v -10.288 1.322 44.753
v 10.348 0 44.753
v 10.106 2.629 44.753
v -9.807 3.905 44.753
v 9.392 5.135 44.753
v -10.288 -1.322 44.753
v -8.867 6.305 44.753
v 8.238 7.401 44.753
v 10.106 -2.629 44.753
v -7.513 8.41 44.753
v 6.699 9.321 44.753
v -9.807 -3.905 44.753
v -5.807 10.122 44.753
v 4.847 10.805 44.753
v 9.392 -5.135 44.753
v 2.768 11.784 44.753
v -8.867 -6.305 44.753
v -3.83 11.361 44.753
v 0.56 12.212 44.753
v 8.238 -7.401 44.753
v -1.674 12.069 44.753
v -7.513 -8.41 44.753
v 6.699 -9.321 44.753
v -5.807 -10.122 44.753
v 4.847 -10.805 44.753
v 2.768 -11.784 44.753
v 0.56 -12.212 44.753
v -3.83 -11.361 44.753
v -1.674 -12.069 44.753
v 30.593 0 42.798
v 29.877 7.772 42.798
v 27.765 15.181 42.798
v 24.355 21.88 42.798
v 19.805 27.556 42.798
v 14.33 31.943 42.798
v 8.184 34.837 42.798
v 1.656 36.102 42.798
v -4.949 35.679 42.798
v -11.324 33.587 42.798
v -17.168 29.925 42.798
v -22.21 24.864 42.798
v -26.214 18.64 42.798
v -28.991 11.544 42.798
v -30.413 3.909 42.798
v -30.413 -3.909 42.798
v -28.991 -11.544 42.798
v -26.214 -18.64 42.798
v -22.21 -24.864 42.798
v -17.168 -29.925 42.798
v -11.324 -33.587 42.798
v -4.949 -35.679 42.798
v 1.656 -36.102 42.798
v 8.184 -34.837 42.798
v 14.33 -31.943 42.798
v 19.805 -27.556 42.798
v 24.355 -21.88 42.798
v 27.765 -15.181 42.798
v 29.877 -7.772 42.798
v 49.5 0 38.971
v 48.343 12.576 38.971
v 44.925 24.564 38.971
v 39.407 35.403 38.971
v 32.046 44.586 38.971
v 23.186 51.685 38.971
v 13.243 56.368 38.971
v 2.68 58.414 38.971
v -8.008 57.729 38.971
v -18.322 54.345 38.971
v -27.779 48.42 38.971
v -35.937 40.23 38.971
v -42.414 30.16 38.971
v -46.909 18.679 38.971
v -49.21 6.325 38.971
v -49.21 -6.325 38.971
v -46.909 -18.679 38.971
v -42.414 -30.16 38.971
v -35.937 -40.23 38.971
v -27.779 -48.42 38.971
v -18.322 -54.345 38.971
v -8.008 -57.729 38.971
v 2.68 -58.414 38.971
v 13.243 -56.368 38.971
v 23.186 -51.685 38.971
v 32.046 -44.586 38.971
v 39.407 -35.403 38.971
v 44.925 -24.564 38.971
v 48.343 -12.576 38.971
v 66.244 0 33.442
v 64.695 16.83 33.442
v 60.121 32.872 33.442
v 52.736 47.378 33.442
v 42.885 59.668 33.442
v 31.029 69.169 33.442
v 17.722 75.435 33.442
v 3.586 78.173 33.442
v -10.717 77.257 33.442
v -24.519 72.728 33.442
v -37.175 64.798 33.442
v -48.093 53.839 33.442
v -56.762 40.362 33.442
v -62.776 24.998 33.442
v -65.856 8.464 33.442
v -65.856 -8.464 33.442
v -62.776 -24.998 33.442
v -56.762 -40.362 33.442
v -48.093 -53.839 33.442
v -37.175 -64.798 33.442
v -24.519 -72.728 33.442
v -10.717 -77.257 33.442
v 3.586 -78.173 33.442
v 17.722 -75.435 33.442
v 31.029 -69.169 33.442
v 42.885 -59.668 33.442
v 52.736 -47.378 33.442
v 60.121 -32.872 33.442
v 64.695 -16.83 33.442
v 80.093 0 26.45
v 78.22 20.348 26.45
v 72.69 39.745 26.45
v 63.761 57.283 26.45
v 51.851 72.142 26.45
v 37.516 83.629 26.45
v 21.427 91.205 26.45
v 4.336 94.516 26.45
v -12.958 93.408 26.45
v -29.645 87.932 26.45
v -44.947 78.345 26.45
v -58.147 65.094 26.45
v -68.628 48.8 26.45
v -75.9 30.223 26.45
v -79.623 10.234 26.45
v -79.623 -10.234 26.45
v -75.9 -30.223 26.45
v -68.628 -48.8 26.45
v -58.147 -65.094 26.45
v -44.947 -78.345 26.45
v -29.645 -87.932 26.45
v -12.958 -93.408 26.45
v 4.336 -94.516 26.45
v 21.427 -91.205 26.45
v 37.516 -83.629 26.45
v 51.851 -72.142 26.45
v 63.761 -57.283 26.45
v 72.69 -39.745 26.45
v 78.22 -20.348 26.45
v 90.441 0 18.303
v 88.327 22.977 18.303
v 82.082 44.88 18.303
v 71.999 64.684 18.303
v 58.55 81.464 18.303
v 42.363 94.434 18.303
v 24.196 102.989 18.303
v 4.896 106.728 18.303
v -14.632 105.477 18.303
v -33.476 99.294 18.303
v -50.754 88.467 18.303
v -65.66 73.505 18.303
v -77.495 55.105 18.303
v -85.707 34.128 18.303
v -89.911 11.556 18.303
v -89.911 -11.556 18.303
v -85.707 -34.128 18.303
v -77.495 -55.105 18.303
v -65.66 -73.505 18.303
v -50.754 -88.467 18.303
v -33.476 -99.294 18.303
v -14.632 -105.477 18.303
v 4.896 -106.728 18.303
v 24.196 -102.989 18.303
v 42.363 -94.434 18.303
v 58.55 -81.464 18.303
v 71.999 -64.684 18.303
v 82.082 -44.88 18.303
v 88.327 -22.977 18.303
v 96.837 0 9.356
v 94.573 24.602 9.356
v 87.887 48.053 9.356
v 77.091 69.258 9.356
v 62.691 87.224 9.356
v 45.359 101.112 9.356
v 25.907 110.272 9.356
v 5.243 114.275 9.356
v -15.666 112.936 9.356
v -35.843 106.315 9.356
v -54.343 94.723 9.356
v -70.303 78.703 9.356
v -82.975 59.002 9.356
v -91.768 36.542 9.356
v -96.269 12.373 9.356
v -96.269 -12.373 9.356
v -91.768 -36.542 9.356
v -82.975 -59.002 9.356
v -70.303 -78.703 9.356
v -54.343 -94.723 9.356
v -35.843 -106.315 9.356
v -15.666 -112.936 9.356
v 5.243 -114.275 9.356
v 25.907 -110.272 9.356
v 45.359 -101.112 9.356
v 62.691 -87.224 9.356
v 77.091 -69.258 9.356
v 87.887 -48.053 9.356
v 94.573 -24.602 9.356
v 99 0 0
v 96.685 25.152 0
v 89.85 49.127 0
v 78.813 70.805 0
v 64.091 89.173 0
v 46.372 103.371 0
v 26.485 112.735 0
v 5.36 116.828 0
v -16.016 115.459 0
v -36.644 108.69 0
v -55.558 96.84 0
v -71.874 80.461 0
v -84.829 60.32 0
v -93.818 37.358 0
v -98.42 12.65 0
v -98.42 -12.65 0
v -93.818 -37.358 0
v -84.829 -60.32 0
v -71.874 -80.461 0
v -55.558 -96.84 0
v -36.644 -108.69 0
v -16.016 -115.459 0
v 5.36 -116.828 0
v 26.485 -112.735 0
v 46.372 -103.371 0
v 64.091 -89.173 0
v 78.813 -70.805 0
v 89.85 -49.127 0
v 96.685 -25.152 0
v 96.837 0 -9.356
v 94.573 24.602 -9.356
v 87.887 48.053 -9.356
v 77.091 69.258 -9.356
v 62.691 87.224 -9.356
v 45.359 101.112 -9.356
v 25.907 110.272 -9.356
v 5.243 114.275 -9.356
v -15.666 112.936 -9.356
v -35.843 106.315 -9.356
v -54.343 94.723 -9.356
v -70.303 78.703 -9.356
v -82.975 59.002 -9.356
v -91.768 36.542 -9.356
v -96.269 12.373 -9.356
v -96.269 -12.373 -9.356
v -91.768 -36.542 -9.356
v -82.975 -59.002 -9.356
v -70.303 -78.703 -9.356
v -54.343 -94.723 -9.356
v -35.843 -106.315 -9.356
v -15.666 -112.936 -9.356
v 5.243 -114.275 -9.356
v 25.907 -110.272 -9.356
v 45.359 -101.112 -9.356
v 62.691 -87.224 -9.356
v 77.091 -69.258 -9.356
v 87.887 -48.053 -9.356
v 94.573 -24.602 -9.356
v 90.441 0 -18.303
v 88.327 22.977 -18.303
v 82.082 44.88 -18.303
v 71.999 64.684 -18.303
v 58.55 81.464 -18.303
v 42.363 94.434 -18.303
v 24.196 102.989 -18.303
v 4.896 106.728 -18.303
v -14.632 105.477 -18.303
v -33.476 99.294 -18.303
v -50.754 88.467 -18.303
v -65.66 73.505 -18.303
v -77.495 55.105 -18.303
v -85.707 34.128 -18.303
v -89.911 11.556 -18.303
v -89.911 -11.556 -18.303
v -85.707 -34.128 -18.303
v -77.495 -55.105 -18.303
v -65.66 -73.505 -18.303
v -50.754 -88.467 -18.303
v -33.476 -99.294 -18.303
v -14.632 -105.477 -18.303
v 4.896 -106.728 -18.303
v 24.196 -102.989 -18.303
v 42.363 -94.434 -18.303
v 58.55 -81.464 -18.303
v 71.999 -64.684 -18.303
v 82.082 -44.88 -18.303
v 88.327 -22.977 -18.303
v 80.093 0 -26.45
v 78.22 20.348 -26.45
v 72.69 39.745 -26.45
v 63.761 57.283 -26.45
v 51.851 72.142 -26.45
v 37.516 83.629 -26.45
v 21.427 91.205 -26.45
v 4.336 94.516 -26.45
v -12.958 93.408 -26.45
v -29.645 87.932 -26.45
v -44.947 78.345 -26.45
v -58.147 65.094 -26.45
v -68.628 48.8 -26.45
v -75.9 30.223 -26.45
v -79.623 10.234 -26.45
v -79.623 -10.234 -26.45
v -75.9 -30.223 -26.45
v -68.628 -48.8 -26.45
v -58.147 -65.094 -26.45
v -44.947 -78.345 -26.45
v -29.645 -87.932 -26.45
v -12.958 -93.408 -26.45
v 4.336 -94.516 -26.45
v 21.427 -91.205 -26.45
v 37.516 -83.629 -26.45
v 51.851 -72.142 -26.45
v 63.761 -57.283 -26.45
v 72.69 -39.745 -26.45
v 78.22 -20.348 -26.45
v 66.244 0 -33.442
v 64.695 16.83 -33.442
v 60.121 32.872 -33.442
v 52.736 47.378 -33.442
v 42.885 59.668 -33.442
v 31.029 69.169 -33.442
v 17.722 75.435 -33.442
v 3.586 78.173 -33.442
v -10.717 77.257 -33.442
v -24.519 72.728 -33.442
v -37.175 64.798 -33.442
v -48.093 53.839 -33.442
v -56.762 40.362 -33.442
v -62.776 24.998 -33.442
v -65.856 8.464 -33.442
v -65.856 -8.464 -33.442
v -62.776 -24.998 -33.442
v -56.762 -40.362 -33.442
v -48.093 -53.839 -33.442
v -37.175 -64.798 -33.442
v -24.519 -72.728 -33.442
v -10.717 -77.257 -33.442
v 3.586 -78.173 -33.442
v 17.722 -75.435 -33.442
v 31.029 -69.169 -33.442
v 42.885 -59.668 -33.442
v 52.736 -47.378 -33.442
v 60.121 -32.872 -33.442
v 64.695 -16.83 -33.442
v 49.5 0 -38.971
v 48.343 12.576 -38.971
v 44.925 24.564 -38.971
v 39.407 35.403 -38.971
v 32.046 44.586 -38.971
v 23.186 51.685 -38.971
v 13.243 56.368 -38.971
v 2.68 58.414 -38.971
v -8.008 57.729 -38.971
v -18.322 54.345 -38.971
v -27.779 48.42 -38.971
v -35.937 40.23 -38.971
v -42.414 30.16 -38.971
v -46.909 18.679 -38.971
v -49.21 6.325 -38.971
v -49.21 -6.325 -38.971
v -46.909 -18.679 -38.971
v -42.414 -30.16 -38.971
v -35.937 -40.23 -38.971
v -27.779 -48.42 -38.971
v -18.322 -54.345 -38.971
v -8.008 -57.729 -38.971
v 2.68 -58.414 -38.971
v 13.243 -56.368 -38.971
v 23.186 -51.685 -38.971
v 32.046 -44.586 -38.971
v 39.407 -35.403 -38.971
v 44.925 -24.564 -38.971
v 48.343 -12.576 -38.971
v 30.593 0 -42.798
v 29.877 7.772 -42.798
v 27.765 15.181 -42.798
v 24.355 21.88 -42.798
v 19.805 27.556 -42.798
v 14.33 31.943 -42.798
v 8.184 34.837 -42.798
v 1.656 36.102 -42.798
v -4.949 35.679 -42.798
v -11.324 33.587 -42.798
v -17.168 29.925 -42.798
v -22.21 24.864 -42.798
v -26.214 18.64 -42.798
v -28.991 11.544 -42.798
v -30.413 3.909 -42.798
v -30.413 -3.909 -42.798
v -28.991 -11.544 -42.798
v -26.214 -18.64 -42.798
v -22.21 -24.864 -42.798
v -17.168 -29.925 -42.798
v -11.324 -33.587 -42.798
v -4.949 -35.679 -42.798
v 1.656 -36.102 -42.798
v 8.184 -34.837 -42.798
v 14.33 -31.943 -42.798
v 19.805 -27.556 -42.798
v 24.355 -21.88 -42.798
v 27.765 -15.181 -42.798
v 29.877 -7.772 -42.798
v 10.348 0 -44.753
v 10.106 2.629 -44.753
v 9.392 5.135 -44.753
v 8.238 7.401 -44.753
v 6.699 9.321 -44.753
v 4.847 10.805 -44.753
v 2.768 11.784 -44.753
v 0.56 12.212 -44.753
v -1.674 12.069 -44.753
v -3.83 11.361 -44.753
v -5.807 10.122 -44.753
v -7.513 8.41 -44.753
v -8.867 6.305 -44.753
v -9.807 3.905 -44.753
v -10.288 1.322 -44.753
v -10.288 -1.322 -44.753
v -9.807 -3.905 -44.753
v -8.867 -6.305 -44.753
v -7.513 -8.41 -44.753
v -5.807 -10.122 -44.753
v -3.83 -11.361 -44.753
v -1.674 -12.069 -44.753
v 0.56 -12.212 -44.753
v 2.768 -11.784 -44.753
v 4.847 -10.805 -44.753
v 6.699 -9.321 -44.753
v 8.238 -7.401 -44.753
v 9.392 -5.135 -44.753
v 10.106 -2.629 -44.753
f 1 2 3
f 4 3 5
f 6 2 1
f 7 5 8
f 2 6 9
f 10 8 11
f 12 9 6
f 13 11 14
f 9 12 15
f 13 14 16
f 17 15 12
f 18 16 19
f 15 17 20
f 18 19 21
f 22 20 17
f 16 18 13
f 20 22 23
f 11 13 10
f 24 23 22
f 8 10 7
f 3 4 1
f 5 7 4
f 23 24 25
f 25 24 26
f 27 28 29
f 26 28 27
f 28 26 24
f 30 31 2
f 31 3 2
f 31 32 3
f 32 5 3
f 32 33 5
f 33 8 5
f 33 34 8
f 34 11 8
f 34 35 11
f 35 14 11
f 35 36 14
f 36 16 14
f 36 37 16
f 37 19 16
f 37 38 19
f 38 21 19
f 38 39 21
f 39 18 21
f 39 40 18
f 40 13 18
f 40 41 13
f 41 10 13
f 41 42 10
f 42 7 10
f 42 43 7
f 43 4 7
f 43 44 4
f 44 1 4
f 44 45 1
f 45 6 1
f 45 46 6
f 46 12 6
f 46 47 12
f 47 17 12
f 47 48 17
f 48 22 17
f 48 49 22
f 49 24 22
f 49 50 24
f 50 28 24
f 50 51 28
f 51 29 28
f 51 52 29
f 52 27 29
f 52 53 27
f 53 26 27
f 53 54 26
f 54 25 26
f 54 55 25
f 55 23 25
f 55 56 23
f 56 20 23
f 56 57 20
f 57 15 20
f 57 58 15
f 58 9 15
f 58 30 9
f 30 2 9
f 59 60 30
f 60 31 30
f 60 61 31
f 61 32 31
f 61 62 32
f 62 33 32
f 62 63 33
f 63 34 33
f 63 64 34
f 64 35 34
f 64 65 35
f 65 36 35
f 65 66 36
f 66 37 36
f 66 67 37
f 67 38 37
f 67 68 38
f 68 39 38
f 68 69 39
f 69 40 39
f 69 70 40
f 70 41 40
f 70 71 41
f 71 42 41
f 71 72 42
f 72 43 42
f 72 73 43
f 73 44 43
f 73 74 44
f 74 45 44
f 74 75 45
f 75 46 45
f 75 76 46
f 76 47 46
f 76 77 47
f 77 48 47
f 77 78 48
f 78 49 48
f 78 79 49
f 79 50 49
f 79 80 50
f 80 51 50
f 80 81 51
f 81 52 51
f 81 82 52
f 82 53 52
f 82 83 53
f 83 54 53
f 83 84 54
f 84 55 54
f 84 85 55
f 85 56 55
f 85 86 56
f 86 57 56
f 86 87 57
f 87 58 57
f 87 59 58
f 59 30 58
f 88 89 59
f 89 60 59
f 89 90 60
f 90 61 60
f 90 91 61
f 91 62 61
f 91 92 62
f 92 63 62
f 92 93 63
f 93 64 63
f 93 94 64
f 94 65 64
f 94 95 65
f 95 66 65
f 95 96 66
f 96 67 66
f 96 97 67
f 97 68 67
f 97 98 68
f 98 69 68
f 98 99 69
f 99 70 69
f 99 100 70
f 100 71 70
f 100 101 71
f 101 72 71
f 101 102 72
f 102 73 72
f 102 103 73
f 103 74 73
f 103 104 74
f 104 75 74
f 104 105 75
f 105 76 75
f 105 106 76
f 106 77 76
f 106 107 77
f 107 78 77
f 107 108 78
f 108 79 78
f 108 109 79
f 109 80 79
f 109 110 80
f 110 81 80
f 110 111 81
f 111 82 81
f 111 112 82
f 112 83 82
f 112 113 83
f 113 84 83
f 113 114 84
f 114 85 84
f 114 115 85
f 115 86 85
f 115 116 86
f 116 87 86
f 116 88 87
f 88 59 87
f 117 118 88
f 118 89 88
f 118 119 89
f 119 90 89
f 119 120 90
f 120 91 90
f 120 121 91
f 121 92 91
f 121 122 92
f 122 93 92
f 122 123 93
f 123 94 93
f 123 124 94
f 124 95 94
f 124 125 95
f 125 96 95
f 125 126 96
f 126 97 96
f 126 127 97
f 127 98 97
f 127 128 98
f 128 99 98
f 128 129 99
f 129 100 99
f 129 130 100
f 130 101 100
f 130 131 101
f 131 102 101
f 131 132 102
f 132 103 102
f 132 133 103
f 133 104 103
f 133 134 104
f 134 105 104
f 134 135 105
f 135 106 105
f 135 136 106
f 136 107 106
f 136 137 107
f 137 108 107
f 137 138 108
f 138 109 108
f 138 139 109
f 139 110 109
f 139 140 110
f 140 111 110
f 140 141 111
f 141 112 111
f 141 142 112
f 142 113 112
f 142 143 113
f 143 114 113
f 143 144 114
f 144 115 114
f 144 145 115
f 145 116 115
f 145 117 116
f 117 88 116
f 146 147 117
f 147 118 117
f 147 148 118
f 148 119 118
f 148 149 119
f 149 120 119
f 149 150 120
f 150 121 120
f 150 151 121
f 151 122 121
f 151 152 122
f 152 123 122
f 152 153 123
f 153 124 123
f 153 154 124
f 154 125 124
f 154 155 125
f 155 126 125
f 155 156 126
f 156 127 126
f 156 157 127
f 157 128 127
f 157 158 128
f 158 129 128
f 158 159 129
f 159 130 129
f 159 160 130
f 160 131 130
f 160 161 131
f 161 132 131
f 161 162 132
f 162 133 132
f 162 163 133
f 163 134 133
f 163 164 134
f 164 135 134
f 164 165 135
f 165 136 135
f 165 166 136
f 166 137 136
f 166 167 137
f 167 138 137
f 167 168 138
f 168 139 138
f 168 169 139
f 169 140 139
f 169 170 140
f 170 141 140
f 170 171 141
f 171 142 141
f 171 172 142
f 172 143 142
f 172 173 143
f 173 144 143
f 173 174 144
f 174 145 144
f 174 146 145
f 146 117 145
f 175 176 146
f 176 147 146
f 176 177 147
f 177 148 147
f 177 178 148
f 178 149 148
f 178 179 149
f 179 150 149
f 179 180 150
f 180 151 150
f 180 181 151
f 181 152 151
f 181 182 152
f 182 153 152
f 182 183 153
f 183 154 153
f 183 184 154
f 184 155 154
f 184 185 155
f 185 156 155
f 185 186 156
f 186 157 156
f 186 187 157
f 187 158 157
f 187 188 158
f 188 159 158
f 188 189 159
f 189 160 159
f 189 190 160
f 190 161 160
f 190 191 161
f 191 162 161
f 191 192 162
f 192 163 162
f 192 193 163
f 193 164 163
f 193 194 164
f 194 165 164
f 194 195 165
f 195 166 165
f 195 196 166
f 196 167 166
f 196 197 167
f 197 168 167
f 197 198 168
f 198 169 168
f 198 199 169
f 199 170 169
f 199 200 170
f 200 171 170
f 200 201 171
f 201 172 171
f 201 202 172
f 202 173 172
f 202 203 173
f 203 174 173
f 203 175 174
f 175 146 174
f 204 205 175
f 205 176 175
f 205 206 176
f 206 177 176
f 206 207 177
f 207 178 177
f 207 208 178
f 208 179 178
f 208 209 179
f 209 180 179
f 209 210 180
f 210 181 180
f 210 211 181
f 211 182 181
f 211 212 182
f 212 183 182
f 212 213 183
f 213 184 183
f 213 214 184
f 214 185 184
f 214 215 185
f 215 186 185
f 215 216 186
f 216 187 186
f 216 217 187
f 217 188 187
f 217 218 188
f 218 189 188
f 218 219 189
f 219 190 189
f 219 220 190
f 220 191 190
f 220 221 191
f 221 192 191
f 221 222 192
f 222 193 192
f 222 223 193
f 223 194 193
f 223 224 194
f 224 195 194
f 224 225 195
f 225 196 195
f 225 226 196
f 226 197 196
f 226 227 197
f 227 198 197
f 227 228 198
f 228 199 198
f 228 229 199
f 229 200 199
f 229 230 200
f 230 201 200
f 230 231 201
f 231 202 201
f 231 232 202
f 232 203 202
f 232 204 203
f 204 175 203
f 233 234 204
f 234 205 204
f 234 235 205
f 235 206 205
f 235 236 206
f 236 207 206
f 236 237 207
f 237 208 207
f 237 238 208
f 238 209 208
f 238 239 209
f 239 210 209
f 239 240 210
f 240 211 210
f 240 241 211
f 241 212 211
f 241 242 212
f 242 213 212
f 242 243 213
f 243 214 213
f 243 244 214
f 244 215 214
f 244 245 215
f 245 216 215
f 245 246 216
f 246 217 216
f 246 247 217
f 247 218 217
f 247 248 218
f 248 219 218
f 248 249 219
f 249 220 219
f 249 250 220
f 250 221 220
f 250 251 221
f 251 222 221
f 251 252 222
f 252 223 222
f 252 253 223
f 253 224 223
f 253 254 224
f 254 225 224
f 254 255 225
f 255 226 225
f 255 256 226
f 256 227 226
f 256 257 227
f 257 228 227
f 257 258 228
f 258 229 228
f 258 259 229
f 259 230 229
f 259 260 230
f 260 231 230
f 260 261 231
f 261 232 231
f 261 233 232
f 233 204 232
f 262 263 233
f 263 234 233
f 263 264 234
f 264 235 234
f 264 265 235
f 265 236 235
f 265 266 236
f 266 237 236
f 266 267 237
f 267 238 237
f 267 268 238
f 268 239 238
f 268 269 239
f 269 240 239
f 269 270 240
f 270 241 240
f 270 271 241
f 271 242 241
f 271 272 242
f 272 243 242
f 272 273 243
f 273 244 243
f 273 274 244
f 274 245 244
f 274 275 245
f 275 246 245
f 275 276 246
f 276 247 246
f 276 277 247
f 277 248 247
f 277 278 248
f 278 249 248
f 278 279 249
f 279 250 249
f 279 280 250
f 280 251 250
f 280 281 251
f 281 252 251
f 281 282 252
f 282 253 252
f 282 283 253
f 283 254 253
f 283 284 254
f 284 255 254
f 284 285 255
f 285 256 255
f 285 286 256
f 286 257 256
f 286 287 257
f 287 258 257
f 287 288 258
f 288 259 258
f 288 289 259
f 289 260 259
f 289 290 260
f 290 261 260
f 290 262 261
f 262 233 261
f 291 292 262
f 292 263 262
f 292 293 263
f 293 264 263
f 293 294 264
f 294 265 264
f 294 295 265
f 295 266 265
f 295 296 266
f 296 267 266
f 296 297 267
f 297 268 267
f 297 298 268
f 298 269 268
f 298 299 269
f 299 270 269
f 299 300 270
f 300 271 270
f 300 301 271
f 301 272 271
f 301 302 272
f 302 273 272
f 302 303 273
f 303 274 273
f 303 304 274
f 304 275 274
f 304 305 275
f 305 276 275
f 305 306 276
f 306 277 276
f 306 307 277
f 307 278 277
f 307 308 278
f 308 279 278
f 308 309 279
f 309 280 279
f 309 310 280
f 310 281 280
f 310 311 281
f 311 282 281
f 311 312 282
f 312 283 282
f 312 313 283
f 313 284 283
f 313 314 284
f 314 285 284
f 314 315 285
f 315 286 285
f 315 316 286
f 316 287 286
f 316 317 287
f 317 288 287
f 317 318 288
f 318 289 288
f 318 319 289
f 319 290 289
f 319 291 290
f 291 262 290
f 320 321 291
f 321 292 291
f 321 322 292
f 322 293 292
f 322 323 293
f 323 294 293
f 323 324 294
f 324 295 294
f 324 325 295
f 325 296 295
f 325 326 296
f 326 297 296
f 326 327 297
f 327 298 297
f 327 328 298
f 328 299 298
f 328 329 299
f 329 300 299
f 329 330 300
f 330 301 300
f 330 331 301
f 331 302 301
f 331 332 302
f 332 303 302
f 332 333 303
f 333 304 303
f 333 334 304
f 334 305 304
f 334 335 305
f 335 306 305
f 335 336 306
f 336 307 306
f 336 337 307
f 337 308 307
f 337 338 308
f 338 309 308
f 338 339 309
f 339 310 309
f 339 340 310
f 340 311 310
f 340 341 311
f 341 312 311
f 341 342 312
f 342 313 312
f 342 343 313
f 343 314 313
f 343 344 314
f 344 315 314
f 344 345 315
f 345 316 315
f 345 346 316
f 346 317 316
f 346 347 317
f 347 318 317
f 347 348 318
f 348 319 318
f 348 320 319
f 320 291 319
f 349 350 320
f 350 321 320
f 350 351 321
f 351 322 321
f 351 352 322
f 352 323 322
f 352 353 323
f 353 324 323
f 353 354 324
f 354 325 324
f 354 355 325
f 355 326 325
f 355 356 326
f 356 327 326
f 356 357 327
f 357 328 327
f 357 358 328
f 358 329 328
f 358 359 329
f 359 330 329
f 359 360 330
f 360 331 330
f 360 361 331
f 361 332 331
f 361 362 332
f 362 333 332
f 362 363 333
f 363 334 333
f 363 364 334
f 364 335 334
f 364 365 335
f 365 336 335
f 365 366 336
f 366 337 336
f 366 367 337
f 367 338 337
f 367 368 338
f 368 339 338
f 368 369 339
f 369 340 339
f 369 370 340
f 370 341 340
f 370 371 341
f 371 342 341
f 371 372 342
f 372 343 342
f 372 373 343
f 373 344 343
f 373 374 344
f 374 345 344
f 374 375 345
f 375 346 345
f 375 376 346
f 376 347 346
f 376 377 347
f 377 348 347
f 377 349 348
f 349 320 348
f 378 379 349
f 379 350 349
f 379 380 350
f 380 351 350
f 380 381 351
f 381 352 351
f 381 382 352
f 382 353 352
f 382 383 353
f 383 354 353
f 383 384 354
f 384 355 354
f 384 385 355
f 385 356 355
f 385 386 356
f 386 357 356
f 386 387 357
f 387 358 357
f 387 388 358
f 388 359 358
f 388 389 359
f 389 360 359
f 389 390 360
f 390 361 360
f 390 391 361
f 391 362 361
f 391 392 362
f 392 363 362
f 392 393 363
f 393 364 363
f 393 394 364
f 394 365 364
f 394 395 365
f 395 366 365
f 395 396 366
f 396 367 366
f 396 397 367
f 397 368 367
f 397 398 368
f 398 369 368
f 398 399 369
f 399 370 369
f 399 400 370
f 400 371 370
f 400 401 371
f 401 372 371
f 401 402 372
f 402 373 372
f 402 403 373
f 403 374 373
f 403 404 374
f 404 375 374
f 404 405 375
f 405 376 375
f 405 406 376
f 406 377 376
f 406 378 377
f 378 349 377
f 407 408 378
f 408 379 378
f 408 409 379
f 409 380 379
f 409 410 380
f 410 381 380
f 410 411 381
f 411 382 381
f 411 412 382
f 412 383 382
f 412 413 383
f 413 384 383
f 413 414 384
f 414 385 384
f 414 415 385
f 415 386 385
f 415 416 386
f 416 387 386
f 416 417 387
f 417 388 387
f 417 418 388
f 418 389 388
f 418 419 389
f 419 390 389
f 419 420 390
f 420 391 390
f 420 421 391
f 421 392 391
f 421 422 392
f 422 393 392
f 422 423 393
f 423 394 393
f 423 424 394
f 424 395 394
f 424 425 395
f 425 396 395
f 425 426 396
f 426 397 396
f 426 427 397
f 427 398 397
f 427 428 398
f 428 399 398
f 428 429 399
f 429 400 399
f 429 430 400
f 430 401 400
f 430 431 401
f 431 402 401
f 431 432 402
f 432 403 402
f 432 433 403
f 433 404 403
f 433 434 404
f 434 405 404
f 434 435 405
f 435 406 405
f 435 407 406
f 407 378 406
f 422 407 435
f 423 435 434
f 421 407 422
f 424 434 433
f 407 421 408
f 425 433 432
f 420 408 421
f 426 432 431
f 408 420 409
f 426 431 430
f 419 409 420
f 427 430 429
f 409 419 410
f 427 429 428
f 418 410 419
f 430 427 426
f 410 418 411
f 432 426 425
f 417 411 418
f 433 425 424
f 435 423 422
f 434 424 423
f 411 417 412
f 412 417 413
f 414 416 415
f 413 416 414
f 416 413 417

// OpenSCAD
// Generated by SolidPython 1.0.1 on 2020-07-29 00:46:49


scale(v = [11, 13, 5]) {
	sphere(r = 9);
}
/***********************************************
*********      SolidPython code:      **********
************************************************
 
# import packages: SolidPython
from solid import *
from solid.utils import *
from itertools import chain, combinations, permutations


class Resize:

    def __init__(self, scad_file):
        self.scad_file = scad_file
        #self.scad_file = import_scad(scad_file)
        # cone/cylinder param:
        self.r1 = 0
        self.r2 = 0
        self.h = 0
        # rectangular prism param:
        self.w = 0
        self.l = 0
        # ellipse param:
        self.r = 0

    # import OpenScad code (file name corresponds to shape)


    # classify shape + parameters
    def assign(self, param1, param2, param3):
        if self.scad_file == 'cone.scad':
            self.r1 = param1
            self.r2 = param2
            self.h = param3
        elif self.scad_file == 'cylinder.scad':
            self.r1 = param1
            self.r2 = param2
            self.h = param3
        elif self.scad_file == 'rectangularPrism.scad':
            self.h = param1
            self.l = param2
            self.w = param3
        else:
            self.r = param1
            self.h = param2

    # resize parameters
    def iterate(self):
        x = range(3, 20, 2)
        i = 1
        if self.scad_file == 'cone.scad':
            tempList = list(permutations(x, 2))
            for temp in tempList:
                param1 = temp[0]
                param2 = temp[1]
                filepath = 'produced_scad_files/' + 'cone' + str(param1) + '_' + str(param2) + '_' + '.scad'
                scad_render_to_file(cylinder(h=param1, r1=param2, r2=0), filepath)

        elif self.scad_file == 'cylinder.scad':
            tempList = list(permutations(x, 3))
            for temp in tempList:
                param1 = temp[0]
                param2 = temp[1]
                filepath = 'produced_scad_files/' + 'cylinder' + str(param1) + '_' + str(param2) + '_' + '.scad'
                scad_render_to_file(cylinder(h=param1, r1=param2, r2=param2), filepath)

        elif self.scad_file == 'rectangularPrism.scad':
            tempList = list(permutations(x, 3))
            for temp in tempList:
                param1 = temp[0]
                param2 = temp[1]
                param3 = temp[2]
                filepath = 'produced_scad_files/' + 'rectangularPrism' + str(param1) + '_' + str(param2) + '_' + str(
                    param3) + '.scad'
                scad_render_to_file(cube(size=(param1, param2, param3)), filepath)

        elif self.scad_file == 'ellipse.scad':
            tempList = list(permutations(x, 4))
            for temp in tempList:
                param1 = temp[0]
                param2 = temp[1]
                param3 = temp[2]
                param4 = temp[3]
                filepath = 'produced_scad_files/' + 'ellipse' + str(param1) + '_' + str(param2) + '_' + str(param3) + '_' + str(param4) + '.scad'
                scad_render_to_file(scale([param1, param2, param3])(sphere(r=param4)), filepath)

    def render_to_scadfile(self):
        scad_render_to_file(scad, 'example.scad') 
 
************************************************/
